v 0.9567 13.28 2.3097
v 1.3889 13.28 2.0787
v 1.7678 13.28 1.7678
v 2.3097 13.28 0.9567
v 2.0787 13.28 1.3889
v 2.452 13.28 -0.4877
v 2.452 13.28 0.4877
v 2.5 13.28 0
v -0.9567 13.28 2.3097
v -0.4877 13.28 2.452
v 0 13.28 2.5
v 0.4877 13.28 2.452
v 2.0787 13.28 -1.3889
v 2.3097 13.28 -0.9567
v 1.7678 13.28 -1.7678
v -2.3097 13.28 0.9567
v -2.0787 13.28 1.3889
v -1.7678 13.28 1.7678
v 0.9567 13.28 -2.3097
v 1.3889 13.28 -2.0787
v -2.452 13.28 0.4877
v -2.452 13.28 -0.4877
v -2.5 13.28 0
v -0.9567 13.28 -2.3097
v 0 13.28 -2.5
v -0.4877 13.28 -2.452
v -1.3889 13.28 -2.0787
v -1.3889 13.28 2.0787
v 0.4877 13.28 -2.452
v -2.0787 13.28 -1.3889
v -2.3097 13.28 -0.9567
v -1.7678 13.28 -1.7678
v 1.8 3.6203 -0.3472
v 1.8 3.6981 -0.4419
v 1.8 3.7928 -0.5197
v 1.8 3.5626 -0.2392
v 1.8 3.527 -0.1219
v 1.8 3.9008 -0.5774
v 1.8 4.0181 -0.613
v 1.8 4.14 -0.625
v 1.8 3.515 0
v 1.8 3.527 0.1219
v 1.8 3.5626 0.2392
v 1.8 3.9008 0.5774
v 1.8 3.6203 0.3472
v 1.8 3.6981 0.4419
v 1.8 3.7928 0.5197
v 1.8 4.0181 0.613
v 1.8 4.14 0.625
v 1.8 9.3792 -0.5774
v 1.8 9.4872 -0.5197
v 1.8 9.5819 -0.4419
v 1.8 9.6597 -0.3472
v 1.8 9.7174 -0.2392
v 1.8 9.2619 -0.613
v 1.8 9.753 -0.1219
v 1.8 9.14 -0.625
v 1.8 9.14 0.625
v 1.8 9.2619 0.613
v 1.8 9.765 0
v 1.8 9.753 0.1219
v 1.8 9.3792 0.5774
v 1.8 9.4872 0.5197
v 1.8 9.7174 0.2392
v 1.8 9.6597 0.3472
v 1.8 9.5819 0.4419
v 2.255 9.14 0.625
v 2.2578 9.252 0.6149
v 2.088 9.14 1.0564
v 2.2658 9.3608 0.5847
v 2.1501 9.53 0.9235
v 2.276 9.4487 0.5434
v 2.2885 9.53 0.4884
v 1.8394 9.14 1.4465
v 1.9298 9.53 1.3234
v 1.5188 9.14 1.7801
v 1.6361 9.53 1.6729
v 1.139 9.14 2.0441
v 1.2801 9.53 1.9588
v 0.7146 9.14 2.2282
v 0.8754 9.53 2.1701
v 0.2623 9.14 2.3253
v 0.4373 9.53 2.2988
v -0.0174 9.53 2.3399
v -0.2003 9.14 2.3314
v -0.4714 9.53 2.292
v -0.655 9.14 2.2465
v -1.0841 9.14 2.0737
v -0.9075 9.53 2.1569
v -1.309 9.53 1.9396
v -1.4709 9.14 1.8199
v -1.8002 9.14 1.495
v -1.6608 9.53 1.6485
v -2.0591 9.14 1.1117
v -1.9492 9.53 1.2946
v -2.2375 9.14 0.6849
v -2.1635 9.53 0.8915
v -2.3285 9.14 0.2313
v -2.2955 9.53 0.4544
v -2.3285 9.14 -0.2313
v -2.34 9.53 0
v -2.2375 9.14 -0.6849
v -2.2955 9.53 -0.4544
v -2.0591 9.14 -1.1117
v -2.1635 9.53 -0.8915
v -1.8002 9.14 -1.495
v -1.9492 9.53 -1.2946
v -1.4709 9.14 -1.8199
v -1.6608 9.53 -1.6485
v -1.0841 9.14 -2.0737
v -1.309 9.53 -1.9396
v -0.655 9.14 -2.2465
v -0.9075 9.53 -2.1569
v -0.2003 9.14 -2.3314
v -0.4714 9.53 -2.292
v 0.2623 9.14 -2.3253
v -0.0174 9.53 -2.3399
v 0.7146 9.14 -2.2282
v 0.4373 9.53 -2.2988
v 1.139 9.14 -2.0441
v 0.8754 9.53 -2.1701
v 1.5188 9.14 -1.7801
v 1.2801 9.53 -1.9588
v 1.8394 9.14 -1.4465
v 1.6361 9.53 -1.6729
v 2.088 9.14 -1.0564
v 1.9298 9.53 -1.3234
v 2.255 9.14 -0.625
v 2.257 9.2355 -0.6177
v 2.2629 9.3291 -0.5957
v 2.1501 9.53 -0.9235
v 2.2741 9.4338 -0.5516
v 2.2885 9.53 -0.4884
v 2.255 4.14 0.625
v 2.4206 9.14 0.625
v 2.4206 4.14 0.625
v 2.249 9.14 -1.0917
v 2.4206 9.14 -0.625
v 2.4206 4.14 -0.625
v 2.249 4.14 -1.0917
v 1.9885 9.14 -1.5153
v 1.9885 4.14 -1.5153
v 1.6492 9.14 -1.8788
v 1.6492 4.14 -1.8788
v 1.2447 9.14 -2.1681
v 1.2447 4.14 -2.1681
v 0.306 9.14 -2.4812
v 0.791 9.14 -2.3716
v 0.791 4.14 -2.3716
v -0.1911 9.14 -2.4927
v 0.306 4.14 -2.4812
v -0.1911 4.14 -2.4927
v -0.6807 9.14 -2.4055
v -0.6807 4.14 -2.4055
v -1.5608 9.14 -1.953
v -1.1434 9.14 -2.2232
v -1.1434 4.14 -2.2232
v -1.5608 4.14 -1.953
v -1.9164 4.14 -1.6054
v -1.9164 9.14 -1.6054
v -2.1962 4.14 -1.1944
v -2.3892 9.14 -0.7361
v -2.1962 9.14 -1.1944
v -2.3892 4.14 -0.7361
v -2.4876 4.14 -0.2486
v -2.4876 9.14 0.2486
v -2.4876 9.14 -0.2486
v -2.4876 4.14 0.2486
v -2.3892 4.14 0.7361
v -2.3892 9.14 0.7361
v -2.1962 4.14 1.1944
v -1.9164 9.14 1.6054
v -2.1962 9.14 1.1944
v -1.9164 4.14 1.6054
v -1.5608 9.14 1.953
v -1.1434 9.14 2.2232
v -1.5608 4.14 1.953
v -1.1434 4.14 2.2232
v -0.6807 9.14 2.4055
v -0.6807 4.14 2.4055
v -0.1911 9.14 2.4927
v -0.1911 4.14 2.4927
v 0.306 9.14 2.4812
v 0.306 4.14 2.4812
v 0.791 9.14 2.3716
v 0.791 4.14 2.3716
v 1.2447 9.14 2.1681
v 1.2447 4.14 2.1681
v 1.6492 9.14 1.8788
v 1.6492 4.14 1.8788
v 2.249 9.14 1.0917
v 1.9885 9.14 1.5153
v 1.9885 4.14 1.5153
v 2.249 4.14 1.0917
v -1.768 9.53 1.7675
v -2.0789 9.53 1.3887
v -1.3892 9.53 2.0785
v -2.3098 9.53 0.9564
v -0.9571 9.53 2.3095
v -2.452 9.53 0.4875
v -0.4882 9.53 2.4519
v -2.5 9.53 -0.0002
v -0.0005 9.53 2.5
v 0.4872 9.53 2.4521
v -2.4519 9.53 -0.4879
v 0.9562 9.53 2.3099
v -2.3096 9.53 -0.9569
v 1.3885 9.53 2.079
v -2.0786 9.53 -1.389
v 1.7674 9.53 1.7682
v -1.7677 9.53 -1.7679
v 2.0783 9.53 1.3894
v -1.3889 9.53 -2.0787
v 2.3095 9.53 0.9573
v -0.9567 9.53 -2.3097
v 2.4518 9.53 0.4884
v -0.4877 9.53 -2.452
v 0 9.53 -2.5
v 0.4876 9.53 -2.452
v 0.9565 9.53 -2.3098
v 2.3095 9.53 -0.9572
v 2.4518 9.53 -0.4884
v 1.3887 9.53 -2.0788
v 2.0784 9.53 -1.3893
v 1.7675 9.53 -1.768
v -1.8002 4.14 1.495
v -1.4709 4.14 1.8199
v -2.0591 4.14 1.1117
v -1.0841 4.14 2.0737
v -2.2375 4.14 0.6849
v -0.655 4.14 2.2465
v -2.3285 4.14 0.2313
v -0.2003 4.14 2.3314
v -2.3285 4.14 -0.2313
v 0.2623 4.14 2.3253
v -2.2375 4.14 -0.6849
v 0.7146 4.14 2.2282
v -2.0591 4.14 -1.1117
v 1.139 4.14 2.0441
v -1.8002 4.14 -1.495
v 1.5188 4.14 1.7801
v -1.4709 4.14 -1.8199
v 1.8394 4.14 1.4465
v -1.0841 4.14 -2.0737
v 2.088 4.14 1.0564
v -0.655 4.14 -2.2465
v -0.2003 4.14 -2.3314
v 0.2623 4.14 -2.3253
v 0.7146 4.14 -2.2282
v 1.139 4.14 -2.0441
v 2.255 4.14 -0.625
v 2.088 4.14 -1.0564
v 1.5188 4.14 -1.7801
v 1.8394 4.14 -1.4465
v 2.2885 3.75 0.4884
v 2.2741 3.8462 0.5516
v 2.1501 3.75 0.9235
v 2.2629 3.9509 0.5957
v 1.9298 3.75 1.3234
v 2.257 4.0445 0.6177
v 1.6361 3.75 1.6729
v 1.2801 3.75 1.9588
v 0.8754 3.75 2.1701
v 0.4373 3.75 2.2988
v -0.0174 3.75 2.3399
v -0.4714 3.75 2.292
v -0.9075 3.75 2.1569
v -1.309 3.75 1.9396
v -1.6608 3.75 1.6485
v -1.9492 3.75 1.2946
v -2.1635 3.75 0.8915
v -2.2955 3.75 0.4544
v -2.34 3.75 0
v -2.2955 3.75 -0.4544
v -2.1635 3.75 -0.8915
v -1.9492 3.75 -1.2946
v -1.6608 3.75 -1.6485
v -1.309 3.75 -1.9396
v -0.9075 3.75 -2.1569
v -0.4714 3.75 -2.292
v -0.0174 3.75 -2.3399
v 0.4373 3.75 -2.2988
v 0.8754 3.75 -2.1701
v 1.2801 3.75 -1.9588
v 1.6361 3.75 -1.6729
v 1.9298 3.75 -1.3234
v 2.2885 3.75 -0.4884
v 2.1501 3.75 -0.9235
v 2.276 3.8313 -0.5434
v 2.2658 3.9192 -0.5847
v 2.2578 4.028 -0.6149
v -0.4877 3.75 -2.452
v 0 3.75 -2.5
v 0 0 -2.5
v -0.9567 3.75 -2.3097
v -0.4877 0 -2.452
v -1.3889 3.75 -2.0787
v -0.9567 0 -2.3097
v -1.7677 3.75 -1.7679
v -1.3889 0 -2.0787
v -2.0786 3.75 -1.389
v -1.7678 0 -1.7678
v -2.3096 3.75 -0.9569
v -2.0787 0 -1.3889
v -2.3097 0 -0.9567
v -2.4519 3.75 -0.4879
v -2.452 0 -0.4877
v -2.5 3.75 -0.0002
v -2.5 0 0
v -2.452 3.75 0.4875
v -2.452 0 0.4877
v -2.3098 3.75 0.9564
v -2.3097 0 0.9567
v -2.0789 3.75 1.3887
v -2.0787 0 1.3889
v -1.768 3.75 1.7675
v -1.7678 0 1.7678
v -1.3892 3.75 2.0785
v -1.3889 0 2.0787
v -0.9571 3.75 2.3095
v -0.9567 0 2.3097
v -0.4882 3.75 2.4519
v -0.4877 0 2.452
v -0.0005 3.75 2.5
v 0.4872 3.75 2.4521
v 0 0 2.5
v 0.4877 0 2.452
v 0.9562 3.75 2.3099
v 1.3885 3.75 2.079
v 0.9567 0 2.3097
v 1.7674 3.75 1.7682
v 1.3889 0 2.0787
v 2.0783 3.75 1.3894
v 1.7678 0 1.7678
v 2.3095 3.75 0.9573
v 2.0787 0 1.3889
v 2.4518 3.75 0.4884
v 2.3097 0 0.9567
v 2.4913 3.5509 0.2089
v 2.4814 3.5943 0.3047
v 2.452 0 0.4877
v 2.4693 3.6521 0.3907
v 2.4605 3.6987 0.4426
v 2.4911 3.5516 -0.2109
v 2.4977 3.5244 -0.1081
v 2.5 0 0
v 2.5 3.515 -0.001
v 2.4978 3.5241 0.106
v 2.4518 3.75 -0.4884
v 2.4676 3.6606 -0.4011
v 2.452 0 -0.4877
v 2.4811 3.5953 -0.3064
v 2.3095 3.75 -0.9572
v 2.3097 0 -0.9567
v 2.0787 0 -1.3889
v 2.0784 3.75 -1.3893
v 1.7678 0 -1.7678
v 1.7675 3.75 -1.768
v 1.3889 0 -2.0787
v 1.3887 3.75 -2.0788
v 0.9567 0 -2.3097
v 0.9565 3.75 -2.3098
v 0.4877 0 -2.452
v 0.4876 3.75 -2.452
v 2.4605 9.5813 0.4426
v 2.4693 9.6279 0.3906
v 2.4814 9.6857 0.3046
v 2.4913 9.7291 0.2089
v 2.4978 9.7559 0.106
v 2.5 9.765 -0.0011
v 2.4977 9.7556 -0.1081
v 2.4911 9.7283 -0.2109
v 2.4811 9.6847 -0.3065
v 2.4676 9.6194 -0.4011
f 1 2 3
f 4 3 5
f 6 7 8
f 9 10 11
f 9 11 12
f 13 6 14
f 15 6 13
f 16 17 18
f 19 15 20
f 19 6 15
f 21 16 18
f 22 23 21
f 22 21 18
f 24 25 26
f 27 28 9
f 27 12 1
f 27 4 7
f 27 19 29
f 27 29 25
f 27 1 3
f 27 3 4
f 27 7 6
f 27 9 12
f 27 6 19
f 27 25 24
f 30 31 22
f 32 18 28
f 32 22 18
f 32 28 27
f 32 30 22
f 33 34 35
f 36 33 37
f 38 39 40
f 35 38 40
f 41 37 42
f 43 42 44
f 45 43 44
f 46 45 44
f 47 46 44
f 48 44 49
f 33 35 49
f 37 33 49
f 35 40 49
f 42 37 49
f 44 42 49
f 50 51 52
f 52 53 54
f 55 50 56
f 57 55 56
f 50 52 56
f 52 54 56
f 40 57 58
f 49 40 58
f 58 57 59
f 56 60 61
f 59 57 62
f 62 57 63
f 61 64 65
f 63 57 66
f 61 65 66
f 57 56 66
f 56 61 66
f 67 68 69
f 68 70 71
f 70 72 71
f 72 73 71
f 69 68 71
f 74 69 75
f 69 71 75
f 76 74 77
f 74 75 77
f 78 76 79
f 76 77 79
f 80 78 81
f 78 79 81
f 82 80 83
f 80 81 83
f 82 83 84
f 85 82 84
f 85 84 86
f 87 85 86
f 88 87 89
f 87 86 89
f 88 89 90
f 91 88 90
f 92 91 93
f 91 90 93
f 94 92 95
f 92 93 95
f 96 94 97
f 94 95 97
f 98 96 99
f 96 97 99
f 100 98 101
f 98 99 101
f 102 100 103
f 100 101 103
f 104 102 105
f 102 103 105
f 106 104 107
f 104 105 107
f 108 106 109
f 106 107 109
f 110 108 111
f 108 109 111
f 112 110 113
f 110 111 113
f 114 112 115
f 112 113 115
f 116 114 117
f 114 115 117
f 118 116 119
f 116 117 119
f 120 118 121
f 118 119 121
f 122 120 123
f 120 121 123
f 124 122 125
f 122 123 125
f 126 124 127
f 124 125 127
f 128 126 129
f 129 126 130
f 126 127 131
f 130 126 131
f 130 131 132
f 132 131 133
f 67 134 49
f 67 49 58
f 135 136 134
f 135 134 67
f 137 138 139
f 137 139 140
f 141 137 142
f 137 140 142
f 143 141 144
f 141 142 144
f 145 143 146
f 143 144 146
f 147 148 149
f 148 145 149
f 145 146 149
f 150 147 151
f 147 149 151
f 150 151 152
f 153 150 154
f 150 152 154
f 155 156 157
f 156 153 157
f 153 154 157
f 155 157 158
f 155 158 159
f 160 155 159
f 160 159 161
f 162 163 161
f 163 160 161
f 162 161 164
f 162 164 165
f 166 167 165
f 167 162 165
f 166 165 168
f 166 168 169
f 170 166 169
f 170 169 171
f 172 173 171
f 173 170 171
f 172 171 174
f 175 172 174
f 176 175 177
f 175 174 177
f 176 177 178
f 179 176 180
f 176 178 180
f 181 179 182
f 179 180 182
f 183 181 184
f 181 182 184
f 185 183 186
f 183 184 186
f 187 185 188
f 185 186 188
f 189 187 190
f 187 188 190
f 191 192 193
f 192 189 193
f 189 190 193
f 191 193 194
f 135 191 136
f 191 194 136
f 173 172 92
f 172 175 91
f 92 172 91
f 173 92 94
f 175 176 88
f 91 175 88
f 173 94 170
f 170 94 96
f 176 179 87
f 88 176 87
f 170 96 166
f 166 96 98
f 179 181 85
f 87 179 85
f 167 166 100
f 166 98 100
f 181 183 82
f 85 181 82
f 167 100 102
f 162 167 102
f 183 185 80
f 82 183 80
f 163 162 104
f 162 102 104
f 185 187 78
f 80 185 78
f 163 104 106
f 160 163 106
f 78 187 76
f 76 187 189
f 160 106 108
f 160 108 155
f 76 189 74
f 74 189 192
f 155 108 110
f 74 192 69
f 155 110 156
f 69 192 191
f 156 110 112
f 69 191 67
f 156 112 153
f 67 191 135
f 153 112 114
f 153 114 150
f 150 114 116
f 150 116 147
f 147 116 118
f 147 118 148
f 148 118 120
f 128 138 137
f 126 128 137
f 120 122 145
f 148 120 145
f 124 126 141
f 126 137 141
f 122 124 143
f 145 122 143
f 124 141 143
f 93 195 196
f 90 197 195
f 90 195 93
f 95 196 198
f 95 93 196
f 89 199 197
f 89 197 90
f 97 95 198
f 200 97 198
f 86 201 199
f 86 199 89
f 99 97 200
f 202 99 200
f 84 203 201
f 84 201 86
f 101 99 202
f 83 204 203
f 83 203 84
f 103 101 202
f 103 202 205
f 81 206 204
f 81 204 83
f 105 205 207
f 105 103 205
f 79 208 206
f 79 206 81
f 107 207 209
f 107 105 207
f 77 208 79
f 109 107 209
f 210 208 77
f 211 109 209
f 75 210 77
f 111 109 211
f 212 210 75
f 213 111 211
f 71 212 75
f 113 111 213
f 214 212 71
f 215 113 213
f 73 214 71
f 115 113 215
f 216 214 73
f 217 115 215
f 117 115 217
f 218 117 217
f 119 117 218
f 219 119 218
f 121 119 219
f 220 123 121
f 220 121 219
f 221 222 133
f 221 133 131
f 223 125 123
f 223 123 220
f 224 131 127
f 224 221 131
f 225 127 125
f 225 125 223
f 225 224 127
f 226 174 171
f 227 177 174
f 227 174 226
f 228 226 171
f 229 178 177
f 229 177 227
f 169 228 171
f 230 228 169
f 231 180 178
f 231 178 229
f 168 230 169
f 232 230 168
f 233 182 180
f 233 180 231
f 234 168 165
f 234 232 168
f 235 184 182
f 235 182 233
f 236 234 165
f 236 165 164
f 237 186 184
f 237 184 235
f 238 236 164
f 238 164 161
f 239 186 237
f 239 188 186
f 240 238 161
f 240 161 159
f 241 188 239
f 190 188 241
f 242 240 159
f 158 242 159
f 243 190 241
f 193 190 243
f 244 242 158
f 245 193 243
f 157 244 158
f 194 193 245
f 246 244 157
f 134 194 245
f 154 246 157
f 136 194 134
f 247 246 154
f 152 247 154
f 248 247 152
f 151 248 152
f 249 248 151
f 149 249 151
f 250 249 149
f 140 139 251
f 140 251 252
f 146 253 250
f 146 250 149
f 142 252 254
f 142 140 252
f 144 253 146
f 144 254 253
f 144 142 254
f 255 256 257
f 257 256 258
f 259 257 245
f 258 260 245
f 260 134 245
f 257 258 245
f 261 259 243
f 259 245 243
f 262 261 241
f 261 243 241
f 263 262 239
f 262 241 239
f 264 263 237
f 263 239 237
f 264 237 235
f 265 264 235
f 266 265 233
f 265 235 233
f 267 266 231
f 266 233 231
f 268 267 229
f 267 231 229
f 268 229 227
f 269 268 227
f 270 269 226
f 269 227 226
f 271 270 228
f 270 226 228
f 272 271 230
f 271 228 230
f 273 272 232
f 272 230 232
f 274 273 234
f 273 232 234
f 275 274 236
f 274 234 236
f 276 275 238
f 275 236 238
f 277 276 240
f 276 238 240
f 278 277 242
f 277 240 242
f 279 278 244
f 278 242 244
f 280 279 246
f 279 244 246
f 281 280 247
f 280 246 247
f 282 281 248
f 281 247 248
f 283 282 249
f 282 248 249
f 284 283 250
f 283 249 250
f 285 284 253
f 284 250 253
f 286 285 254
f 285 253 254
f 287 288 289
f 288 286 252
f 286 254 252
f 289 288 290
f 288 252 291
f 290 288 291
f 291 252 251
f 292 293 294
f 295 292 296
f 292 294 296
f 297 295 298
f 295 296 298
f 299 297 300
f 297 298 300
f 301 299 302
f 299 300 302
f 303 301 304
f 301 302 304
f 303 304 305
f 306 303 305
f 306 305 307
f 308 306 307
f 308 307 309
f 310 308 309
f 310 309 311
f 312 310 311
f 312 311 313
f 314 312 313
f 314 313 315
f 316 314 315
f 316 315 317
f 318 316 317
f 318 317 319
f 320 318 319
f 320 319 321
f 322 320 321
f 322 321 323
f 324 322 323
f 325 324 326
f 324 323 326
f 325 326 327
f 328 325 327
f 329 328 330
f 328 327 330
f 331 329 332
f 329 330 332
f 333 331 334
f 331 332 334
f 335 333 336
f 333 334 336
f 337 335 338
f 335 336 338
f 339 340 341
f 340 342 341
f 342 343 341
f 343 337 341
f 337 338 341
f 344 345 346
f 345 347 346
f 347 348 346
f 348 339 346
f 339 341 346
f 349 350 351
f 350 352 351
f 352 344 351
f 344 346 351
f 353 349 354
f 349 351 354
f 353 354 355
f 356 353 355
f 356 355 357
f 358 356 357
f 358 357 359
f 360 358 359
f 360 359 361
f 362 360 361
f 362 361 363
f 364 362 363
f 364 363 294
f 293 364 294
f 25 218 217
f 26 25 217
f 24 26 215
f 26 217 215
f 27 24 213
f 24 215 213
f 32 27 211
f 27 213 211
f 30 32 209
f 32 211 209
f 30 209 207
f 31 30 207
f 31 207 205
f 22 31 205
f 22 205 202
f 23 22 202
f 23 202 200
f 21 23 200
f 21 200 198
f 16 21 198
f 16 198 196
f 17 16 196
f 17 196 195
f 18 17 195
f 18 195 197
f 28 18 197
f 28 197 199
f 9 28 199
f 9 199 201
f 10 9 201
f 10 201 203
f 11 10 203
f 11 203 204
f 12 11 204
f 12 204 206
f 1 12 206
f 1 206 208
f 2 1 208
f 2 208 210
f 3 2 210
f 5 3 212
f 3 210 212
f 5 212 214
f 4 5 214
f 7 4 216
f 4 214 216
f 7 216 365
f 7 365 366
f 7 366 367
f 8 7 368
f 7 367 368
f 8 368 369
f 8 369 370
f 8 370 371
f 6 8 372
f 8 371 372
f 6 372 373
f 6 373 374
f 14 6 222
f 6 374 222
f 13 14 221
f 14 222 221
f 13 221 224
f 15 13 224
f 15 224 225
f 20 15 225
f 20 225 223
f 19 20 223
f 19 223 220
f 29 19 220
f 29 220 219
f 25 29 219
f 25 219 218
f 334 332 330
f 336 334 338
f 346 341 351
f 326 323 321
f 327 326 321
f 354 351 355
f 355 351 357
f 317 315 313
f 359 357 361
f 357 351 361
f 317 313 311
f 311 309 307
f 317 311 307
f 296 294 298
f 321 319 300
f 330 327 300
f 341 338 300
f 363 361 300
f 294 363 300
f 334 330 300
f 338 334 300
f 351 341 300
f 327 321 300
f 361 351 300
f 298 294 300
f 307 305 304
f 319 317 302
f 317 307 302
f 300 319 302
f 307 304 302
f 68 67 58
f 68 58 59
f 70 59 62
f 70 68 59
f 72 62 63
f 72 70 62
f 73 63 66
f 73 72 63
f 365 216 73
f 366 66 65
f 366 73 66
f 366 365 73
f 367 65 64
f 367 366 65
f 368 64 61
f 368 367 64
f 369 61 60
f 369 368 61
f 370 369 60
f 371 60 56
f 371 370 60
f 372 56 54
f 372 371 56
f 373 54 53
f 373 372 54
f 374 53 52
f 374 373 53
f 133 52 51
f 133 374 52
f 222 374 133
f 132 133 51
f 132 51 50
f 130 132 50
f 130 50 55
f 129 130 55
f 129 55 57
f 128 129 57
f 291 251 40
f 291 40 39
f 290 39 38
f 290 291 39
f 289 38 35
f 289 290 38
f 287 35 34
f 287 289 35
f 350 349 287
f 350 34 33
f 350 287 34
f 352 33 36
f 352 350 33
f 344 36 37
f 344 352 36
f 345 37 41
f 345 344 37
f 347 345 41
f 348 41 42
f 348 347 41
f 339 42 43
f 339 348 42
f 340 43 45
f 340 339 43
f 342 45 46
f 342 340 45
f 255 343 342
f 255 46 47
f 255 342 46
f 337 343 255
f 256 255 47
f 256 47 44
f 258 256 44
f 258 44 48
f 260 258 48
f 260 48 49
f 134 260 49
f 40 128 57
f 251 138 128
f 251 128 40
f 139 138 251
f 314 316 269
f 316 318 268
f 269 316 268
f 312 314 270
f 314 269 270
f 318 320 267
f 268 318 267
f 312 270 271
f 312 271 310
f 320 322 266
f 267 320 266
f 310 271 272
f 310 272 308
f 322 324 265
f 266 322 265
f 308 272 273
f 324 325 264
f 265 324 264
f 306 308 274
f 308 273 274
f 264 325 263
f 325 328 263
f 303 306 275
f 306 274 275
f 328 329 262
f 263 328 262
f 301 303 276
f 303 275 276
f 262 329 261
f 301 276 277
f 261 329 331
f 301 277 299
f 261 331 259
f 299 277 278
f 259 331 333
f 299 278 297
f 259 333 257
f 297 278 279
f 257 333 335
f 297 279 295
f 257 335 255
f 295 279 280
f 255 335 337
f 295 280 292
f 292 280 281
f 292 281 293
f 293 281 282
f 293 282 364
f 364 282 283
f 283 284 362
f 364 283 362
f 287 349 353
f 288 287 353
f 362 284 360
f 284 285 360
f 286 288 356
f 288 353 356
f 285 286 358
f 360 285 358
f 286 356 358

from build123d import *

# Parameters (mm, degrees)
SKETCH1_R           = 2.5
BOSS_EXTRUDE1_DEPTH = 13.28
SKETCH2_W           = 6.44702982
SKETCH2_H           = 0.39
SKETCH3_W           = 6.610697995
SKETCH3_H           = 0.39
CUT_EXTRUDE1_DEPTH  = 0.7


with BuildPart() as part:
    # Sketch1 → Boss-Extrude1 (new body)
    with BuildSketch(Plane(origin=(0, 0, 0), x_dir=(1, 0, 0), z_dir=(0, 1, 0))):
        with Locations(Location((0, 0, 0), (0, 0, 90))):
            Circle(SKETCH1_R)
    extrude(amount=BOSS_EXTRUDE1_DEPTH)

    # Sketch2 → Cut-Revolve1 (revolve, cut)
    with BuildSketch(Plane(origin=(0, 0, 0), x_dir=(0, 0, -1), z_dir=(1, 0, 0)), mode=Mode.PRIVATE) as cut_revolve1_sk:
        with Locations((-5.56351491, 9.335)):
            Rectangle(SKETCH2_W, SKETCH2_H)
    revolve(cut_revolve1_sk.sketch.rotate(Axis((0, 10.194505394, 0), (0, -1, 0)), 180), axis=Axis((0, 10.194505394, 0), (0, -1, 0)), mode=Mode.SUBTRACT)

    # Sketch3 → Cut-Revolve2 (revolve, cut)
    with BuildSketch(Plane(origin=(0, 0, 0), x_dir=(0, 0, -1), z_dir=(1, 0, 0)), mode=Mode.PRIVATE) as cut_revolve2_sk:
        with Locations((-5.645348998, 3.945)):
            Rectangle(SKETCH3_W, SKETCH3_H)
    revolve(cut_revolve2_sk.sketch.rotate(Axis((0, 6.07806317, 0), (0, -1, 0)), 180), axis=Axis((0, 6.07806317, 0), (0, -1, 0)), mode=Mode.SUBTRACT)

    # Sketch4 → Cut-Extrude1 (cut)
    with BuildSketch(Plane(origin=(2.5, 0, 0), x_dir=(0, 0, -1), z_dir=(1, 0, 0))):
        with BuildLine():
            Line((0.625, 9.14), (0.625, 4.14))
            ThreePointArc((0.625, 4.14), (0, 3.515), (-0.625, 4.14))
            Line((-0.625, 4.14), (-0.625, 9.14))
            ThreePointArc((-0.625, 9.14), (0, 9.765), (0.625, 9.14))
        make_face()
    extrude(amount=-CUT_EXTRUDE1_DEPTH, mode=Mode.SUBTRACT)


solid = part.part
